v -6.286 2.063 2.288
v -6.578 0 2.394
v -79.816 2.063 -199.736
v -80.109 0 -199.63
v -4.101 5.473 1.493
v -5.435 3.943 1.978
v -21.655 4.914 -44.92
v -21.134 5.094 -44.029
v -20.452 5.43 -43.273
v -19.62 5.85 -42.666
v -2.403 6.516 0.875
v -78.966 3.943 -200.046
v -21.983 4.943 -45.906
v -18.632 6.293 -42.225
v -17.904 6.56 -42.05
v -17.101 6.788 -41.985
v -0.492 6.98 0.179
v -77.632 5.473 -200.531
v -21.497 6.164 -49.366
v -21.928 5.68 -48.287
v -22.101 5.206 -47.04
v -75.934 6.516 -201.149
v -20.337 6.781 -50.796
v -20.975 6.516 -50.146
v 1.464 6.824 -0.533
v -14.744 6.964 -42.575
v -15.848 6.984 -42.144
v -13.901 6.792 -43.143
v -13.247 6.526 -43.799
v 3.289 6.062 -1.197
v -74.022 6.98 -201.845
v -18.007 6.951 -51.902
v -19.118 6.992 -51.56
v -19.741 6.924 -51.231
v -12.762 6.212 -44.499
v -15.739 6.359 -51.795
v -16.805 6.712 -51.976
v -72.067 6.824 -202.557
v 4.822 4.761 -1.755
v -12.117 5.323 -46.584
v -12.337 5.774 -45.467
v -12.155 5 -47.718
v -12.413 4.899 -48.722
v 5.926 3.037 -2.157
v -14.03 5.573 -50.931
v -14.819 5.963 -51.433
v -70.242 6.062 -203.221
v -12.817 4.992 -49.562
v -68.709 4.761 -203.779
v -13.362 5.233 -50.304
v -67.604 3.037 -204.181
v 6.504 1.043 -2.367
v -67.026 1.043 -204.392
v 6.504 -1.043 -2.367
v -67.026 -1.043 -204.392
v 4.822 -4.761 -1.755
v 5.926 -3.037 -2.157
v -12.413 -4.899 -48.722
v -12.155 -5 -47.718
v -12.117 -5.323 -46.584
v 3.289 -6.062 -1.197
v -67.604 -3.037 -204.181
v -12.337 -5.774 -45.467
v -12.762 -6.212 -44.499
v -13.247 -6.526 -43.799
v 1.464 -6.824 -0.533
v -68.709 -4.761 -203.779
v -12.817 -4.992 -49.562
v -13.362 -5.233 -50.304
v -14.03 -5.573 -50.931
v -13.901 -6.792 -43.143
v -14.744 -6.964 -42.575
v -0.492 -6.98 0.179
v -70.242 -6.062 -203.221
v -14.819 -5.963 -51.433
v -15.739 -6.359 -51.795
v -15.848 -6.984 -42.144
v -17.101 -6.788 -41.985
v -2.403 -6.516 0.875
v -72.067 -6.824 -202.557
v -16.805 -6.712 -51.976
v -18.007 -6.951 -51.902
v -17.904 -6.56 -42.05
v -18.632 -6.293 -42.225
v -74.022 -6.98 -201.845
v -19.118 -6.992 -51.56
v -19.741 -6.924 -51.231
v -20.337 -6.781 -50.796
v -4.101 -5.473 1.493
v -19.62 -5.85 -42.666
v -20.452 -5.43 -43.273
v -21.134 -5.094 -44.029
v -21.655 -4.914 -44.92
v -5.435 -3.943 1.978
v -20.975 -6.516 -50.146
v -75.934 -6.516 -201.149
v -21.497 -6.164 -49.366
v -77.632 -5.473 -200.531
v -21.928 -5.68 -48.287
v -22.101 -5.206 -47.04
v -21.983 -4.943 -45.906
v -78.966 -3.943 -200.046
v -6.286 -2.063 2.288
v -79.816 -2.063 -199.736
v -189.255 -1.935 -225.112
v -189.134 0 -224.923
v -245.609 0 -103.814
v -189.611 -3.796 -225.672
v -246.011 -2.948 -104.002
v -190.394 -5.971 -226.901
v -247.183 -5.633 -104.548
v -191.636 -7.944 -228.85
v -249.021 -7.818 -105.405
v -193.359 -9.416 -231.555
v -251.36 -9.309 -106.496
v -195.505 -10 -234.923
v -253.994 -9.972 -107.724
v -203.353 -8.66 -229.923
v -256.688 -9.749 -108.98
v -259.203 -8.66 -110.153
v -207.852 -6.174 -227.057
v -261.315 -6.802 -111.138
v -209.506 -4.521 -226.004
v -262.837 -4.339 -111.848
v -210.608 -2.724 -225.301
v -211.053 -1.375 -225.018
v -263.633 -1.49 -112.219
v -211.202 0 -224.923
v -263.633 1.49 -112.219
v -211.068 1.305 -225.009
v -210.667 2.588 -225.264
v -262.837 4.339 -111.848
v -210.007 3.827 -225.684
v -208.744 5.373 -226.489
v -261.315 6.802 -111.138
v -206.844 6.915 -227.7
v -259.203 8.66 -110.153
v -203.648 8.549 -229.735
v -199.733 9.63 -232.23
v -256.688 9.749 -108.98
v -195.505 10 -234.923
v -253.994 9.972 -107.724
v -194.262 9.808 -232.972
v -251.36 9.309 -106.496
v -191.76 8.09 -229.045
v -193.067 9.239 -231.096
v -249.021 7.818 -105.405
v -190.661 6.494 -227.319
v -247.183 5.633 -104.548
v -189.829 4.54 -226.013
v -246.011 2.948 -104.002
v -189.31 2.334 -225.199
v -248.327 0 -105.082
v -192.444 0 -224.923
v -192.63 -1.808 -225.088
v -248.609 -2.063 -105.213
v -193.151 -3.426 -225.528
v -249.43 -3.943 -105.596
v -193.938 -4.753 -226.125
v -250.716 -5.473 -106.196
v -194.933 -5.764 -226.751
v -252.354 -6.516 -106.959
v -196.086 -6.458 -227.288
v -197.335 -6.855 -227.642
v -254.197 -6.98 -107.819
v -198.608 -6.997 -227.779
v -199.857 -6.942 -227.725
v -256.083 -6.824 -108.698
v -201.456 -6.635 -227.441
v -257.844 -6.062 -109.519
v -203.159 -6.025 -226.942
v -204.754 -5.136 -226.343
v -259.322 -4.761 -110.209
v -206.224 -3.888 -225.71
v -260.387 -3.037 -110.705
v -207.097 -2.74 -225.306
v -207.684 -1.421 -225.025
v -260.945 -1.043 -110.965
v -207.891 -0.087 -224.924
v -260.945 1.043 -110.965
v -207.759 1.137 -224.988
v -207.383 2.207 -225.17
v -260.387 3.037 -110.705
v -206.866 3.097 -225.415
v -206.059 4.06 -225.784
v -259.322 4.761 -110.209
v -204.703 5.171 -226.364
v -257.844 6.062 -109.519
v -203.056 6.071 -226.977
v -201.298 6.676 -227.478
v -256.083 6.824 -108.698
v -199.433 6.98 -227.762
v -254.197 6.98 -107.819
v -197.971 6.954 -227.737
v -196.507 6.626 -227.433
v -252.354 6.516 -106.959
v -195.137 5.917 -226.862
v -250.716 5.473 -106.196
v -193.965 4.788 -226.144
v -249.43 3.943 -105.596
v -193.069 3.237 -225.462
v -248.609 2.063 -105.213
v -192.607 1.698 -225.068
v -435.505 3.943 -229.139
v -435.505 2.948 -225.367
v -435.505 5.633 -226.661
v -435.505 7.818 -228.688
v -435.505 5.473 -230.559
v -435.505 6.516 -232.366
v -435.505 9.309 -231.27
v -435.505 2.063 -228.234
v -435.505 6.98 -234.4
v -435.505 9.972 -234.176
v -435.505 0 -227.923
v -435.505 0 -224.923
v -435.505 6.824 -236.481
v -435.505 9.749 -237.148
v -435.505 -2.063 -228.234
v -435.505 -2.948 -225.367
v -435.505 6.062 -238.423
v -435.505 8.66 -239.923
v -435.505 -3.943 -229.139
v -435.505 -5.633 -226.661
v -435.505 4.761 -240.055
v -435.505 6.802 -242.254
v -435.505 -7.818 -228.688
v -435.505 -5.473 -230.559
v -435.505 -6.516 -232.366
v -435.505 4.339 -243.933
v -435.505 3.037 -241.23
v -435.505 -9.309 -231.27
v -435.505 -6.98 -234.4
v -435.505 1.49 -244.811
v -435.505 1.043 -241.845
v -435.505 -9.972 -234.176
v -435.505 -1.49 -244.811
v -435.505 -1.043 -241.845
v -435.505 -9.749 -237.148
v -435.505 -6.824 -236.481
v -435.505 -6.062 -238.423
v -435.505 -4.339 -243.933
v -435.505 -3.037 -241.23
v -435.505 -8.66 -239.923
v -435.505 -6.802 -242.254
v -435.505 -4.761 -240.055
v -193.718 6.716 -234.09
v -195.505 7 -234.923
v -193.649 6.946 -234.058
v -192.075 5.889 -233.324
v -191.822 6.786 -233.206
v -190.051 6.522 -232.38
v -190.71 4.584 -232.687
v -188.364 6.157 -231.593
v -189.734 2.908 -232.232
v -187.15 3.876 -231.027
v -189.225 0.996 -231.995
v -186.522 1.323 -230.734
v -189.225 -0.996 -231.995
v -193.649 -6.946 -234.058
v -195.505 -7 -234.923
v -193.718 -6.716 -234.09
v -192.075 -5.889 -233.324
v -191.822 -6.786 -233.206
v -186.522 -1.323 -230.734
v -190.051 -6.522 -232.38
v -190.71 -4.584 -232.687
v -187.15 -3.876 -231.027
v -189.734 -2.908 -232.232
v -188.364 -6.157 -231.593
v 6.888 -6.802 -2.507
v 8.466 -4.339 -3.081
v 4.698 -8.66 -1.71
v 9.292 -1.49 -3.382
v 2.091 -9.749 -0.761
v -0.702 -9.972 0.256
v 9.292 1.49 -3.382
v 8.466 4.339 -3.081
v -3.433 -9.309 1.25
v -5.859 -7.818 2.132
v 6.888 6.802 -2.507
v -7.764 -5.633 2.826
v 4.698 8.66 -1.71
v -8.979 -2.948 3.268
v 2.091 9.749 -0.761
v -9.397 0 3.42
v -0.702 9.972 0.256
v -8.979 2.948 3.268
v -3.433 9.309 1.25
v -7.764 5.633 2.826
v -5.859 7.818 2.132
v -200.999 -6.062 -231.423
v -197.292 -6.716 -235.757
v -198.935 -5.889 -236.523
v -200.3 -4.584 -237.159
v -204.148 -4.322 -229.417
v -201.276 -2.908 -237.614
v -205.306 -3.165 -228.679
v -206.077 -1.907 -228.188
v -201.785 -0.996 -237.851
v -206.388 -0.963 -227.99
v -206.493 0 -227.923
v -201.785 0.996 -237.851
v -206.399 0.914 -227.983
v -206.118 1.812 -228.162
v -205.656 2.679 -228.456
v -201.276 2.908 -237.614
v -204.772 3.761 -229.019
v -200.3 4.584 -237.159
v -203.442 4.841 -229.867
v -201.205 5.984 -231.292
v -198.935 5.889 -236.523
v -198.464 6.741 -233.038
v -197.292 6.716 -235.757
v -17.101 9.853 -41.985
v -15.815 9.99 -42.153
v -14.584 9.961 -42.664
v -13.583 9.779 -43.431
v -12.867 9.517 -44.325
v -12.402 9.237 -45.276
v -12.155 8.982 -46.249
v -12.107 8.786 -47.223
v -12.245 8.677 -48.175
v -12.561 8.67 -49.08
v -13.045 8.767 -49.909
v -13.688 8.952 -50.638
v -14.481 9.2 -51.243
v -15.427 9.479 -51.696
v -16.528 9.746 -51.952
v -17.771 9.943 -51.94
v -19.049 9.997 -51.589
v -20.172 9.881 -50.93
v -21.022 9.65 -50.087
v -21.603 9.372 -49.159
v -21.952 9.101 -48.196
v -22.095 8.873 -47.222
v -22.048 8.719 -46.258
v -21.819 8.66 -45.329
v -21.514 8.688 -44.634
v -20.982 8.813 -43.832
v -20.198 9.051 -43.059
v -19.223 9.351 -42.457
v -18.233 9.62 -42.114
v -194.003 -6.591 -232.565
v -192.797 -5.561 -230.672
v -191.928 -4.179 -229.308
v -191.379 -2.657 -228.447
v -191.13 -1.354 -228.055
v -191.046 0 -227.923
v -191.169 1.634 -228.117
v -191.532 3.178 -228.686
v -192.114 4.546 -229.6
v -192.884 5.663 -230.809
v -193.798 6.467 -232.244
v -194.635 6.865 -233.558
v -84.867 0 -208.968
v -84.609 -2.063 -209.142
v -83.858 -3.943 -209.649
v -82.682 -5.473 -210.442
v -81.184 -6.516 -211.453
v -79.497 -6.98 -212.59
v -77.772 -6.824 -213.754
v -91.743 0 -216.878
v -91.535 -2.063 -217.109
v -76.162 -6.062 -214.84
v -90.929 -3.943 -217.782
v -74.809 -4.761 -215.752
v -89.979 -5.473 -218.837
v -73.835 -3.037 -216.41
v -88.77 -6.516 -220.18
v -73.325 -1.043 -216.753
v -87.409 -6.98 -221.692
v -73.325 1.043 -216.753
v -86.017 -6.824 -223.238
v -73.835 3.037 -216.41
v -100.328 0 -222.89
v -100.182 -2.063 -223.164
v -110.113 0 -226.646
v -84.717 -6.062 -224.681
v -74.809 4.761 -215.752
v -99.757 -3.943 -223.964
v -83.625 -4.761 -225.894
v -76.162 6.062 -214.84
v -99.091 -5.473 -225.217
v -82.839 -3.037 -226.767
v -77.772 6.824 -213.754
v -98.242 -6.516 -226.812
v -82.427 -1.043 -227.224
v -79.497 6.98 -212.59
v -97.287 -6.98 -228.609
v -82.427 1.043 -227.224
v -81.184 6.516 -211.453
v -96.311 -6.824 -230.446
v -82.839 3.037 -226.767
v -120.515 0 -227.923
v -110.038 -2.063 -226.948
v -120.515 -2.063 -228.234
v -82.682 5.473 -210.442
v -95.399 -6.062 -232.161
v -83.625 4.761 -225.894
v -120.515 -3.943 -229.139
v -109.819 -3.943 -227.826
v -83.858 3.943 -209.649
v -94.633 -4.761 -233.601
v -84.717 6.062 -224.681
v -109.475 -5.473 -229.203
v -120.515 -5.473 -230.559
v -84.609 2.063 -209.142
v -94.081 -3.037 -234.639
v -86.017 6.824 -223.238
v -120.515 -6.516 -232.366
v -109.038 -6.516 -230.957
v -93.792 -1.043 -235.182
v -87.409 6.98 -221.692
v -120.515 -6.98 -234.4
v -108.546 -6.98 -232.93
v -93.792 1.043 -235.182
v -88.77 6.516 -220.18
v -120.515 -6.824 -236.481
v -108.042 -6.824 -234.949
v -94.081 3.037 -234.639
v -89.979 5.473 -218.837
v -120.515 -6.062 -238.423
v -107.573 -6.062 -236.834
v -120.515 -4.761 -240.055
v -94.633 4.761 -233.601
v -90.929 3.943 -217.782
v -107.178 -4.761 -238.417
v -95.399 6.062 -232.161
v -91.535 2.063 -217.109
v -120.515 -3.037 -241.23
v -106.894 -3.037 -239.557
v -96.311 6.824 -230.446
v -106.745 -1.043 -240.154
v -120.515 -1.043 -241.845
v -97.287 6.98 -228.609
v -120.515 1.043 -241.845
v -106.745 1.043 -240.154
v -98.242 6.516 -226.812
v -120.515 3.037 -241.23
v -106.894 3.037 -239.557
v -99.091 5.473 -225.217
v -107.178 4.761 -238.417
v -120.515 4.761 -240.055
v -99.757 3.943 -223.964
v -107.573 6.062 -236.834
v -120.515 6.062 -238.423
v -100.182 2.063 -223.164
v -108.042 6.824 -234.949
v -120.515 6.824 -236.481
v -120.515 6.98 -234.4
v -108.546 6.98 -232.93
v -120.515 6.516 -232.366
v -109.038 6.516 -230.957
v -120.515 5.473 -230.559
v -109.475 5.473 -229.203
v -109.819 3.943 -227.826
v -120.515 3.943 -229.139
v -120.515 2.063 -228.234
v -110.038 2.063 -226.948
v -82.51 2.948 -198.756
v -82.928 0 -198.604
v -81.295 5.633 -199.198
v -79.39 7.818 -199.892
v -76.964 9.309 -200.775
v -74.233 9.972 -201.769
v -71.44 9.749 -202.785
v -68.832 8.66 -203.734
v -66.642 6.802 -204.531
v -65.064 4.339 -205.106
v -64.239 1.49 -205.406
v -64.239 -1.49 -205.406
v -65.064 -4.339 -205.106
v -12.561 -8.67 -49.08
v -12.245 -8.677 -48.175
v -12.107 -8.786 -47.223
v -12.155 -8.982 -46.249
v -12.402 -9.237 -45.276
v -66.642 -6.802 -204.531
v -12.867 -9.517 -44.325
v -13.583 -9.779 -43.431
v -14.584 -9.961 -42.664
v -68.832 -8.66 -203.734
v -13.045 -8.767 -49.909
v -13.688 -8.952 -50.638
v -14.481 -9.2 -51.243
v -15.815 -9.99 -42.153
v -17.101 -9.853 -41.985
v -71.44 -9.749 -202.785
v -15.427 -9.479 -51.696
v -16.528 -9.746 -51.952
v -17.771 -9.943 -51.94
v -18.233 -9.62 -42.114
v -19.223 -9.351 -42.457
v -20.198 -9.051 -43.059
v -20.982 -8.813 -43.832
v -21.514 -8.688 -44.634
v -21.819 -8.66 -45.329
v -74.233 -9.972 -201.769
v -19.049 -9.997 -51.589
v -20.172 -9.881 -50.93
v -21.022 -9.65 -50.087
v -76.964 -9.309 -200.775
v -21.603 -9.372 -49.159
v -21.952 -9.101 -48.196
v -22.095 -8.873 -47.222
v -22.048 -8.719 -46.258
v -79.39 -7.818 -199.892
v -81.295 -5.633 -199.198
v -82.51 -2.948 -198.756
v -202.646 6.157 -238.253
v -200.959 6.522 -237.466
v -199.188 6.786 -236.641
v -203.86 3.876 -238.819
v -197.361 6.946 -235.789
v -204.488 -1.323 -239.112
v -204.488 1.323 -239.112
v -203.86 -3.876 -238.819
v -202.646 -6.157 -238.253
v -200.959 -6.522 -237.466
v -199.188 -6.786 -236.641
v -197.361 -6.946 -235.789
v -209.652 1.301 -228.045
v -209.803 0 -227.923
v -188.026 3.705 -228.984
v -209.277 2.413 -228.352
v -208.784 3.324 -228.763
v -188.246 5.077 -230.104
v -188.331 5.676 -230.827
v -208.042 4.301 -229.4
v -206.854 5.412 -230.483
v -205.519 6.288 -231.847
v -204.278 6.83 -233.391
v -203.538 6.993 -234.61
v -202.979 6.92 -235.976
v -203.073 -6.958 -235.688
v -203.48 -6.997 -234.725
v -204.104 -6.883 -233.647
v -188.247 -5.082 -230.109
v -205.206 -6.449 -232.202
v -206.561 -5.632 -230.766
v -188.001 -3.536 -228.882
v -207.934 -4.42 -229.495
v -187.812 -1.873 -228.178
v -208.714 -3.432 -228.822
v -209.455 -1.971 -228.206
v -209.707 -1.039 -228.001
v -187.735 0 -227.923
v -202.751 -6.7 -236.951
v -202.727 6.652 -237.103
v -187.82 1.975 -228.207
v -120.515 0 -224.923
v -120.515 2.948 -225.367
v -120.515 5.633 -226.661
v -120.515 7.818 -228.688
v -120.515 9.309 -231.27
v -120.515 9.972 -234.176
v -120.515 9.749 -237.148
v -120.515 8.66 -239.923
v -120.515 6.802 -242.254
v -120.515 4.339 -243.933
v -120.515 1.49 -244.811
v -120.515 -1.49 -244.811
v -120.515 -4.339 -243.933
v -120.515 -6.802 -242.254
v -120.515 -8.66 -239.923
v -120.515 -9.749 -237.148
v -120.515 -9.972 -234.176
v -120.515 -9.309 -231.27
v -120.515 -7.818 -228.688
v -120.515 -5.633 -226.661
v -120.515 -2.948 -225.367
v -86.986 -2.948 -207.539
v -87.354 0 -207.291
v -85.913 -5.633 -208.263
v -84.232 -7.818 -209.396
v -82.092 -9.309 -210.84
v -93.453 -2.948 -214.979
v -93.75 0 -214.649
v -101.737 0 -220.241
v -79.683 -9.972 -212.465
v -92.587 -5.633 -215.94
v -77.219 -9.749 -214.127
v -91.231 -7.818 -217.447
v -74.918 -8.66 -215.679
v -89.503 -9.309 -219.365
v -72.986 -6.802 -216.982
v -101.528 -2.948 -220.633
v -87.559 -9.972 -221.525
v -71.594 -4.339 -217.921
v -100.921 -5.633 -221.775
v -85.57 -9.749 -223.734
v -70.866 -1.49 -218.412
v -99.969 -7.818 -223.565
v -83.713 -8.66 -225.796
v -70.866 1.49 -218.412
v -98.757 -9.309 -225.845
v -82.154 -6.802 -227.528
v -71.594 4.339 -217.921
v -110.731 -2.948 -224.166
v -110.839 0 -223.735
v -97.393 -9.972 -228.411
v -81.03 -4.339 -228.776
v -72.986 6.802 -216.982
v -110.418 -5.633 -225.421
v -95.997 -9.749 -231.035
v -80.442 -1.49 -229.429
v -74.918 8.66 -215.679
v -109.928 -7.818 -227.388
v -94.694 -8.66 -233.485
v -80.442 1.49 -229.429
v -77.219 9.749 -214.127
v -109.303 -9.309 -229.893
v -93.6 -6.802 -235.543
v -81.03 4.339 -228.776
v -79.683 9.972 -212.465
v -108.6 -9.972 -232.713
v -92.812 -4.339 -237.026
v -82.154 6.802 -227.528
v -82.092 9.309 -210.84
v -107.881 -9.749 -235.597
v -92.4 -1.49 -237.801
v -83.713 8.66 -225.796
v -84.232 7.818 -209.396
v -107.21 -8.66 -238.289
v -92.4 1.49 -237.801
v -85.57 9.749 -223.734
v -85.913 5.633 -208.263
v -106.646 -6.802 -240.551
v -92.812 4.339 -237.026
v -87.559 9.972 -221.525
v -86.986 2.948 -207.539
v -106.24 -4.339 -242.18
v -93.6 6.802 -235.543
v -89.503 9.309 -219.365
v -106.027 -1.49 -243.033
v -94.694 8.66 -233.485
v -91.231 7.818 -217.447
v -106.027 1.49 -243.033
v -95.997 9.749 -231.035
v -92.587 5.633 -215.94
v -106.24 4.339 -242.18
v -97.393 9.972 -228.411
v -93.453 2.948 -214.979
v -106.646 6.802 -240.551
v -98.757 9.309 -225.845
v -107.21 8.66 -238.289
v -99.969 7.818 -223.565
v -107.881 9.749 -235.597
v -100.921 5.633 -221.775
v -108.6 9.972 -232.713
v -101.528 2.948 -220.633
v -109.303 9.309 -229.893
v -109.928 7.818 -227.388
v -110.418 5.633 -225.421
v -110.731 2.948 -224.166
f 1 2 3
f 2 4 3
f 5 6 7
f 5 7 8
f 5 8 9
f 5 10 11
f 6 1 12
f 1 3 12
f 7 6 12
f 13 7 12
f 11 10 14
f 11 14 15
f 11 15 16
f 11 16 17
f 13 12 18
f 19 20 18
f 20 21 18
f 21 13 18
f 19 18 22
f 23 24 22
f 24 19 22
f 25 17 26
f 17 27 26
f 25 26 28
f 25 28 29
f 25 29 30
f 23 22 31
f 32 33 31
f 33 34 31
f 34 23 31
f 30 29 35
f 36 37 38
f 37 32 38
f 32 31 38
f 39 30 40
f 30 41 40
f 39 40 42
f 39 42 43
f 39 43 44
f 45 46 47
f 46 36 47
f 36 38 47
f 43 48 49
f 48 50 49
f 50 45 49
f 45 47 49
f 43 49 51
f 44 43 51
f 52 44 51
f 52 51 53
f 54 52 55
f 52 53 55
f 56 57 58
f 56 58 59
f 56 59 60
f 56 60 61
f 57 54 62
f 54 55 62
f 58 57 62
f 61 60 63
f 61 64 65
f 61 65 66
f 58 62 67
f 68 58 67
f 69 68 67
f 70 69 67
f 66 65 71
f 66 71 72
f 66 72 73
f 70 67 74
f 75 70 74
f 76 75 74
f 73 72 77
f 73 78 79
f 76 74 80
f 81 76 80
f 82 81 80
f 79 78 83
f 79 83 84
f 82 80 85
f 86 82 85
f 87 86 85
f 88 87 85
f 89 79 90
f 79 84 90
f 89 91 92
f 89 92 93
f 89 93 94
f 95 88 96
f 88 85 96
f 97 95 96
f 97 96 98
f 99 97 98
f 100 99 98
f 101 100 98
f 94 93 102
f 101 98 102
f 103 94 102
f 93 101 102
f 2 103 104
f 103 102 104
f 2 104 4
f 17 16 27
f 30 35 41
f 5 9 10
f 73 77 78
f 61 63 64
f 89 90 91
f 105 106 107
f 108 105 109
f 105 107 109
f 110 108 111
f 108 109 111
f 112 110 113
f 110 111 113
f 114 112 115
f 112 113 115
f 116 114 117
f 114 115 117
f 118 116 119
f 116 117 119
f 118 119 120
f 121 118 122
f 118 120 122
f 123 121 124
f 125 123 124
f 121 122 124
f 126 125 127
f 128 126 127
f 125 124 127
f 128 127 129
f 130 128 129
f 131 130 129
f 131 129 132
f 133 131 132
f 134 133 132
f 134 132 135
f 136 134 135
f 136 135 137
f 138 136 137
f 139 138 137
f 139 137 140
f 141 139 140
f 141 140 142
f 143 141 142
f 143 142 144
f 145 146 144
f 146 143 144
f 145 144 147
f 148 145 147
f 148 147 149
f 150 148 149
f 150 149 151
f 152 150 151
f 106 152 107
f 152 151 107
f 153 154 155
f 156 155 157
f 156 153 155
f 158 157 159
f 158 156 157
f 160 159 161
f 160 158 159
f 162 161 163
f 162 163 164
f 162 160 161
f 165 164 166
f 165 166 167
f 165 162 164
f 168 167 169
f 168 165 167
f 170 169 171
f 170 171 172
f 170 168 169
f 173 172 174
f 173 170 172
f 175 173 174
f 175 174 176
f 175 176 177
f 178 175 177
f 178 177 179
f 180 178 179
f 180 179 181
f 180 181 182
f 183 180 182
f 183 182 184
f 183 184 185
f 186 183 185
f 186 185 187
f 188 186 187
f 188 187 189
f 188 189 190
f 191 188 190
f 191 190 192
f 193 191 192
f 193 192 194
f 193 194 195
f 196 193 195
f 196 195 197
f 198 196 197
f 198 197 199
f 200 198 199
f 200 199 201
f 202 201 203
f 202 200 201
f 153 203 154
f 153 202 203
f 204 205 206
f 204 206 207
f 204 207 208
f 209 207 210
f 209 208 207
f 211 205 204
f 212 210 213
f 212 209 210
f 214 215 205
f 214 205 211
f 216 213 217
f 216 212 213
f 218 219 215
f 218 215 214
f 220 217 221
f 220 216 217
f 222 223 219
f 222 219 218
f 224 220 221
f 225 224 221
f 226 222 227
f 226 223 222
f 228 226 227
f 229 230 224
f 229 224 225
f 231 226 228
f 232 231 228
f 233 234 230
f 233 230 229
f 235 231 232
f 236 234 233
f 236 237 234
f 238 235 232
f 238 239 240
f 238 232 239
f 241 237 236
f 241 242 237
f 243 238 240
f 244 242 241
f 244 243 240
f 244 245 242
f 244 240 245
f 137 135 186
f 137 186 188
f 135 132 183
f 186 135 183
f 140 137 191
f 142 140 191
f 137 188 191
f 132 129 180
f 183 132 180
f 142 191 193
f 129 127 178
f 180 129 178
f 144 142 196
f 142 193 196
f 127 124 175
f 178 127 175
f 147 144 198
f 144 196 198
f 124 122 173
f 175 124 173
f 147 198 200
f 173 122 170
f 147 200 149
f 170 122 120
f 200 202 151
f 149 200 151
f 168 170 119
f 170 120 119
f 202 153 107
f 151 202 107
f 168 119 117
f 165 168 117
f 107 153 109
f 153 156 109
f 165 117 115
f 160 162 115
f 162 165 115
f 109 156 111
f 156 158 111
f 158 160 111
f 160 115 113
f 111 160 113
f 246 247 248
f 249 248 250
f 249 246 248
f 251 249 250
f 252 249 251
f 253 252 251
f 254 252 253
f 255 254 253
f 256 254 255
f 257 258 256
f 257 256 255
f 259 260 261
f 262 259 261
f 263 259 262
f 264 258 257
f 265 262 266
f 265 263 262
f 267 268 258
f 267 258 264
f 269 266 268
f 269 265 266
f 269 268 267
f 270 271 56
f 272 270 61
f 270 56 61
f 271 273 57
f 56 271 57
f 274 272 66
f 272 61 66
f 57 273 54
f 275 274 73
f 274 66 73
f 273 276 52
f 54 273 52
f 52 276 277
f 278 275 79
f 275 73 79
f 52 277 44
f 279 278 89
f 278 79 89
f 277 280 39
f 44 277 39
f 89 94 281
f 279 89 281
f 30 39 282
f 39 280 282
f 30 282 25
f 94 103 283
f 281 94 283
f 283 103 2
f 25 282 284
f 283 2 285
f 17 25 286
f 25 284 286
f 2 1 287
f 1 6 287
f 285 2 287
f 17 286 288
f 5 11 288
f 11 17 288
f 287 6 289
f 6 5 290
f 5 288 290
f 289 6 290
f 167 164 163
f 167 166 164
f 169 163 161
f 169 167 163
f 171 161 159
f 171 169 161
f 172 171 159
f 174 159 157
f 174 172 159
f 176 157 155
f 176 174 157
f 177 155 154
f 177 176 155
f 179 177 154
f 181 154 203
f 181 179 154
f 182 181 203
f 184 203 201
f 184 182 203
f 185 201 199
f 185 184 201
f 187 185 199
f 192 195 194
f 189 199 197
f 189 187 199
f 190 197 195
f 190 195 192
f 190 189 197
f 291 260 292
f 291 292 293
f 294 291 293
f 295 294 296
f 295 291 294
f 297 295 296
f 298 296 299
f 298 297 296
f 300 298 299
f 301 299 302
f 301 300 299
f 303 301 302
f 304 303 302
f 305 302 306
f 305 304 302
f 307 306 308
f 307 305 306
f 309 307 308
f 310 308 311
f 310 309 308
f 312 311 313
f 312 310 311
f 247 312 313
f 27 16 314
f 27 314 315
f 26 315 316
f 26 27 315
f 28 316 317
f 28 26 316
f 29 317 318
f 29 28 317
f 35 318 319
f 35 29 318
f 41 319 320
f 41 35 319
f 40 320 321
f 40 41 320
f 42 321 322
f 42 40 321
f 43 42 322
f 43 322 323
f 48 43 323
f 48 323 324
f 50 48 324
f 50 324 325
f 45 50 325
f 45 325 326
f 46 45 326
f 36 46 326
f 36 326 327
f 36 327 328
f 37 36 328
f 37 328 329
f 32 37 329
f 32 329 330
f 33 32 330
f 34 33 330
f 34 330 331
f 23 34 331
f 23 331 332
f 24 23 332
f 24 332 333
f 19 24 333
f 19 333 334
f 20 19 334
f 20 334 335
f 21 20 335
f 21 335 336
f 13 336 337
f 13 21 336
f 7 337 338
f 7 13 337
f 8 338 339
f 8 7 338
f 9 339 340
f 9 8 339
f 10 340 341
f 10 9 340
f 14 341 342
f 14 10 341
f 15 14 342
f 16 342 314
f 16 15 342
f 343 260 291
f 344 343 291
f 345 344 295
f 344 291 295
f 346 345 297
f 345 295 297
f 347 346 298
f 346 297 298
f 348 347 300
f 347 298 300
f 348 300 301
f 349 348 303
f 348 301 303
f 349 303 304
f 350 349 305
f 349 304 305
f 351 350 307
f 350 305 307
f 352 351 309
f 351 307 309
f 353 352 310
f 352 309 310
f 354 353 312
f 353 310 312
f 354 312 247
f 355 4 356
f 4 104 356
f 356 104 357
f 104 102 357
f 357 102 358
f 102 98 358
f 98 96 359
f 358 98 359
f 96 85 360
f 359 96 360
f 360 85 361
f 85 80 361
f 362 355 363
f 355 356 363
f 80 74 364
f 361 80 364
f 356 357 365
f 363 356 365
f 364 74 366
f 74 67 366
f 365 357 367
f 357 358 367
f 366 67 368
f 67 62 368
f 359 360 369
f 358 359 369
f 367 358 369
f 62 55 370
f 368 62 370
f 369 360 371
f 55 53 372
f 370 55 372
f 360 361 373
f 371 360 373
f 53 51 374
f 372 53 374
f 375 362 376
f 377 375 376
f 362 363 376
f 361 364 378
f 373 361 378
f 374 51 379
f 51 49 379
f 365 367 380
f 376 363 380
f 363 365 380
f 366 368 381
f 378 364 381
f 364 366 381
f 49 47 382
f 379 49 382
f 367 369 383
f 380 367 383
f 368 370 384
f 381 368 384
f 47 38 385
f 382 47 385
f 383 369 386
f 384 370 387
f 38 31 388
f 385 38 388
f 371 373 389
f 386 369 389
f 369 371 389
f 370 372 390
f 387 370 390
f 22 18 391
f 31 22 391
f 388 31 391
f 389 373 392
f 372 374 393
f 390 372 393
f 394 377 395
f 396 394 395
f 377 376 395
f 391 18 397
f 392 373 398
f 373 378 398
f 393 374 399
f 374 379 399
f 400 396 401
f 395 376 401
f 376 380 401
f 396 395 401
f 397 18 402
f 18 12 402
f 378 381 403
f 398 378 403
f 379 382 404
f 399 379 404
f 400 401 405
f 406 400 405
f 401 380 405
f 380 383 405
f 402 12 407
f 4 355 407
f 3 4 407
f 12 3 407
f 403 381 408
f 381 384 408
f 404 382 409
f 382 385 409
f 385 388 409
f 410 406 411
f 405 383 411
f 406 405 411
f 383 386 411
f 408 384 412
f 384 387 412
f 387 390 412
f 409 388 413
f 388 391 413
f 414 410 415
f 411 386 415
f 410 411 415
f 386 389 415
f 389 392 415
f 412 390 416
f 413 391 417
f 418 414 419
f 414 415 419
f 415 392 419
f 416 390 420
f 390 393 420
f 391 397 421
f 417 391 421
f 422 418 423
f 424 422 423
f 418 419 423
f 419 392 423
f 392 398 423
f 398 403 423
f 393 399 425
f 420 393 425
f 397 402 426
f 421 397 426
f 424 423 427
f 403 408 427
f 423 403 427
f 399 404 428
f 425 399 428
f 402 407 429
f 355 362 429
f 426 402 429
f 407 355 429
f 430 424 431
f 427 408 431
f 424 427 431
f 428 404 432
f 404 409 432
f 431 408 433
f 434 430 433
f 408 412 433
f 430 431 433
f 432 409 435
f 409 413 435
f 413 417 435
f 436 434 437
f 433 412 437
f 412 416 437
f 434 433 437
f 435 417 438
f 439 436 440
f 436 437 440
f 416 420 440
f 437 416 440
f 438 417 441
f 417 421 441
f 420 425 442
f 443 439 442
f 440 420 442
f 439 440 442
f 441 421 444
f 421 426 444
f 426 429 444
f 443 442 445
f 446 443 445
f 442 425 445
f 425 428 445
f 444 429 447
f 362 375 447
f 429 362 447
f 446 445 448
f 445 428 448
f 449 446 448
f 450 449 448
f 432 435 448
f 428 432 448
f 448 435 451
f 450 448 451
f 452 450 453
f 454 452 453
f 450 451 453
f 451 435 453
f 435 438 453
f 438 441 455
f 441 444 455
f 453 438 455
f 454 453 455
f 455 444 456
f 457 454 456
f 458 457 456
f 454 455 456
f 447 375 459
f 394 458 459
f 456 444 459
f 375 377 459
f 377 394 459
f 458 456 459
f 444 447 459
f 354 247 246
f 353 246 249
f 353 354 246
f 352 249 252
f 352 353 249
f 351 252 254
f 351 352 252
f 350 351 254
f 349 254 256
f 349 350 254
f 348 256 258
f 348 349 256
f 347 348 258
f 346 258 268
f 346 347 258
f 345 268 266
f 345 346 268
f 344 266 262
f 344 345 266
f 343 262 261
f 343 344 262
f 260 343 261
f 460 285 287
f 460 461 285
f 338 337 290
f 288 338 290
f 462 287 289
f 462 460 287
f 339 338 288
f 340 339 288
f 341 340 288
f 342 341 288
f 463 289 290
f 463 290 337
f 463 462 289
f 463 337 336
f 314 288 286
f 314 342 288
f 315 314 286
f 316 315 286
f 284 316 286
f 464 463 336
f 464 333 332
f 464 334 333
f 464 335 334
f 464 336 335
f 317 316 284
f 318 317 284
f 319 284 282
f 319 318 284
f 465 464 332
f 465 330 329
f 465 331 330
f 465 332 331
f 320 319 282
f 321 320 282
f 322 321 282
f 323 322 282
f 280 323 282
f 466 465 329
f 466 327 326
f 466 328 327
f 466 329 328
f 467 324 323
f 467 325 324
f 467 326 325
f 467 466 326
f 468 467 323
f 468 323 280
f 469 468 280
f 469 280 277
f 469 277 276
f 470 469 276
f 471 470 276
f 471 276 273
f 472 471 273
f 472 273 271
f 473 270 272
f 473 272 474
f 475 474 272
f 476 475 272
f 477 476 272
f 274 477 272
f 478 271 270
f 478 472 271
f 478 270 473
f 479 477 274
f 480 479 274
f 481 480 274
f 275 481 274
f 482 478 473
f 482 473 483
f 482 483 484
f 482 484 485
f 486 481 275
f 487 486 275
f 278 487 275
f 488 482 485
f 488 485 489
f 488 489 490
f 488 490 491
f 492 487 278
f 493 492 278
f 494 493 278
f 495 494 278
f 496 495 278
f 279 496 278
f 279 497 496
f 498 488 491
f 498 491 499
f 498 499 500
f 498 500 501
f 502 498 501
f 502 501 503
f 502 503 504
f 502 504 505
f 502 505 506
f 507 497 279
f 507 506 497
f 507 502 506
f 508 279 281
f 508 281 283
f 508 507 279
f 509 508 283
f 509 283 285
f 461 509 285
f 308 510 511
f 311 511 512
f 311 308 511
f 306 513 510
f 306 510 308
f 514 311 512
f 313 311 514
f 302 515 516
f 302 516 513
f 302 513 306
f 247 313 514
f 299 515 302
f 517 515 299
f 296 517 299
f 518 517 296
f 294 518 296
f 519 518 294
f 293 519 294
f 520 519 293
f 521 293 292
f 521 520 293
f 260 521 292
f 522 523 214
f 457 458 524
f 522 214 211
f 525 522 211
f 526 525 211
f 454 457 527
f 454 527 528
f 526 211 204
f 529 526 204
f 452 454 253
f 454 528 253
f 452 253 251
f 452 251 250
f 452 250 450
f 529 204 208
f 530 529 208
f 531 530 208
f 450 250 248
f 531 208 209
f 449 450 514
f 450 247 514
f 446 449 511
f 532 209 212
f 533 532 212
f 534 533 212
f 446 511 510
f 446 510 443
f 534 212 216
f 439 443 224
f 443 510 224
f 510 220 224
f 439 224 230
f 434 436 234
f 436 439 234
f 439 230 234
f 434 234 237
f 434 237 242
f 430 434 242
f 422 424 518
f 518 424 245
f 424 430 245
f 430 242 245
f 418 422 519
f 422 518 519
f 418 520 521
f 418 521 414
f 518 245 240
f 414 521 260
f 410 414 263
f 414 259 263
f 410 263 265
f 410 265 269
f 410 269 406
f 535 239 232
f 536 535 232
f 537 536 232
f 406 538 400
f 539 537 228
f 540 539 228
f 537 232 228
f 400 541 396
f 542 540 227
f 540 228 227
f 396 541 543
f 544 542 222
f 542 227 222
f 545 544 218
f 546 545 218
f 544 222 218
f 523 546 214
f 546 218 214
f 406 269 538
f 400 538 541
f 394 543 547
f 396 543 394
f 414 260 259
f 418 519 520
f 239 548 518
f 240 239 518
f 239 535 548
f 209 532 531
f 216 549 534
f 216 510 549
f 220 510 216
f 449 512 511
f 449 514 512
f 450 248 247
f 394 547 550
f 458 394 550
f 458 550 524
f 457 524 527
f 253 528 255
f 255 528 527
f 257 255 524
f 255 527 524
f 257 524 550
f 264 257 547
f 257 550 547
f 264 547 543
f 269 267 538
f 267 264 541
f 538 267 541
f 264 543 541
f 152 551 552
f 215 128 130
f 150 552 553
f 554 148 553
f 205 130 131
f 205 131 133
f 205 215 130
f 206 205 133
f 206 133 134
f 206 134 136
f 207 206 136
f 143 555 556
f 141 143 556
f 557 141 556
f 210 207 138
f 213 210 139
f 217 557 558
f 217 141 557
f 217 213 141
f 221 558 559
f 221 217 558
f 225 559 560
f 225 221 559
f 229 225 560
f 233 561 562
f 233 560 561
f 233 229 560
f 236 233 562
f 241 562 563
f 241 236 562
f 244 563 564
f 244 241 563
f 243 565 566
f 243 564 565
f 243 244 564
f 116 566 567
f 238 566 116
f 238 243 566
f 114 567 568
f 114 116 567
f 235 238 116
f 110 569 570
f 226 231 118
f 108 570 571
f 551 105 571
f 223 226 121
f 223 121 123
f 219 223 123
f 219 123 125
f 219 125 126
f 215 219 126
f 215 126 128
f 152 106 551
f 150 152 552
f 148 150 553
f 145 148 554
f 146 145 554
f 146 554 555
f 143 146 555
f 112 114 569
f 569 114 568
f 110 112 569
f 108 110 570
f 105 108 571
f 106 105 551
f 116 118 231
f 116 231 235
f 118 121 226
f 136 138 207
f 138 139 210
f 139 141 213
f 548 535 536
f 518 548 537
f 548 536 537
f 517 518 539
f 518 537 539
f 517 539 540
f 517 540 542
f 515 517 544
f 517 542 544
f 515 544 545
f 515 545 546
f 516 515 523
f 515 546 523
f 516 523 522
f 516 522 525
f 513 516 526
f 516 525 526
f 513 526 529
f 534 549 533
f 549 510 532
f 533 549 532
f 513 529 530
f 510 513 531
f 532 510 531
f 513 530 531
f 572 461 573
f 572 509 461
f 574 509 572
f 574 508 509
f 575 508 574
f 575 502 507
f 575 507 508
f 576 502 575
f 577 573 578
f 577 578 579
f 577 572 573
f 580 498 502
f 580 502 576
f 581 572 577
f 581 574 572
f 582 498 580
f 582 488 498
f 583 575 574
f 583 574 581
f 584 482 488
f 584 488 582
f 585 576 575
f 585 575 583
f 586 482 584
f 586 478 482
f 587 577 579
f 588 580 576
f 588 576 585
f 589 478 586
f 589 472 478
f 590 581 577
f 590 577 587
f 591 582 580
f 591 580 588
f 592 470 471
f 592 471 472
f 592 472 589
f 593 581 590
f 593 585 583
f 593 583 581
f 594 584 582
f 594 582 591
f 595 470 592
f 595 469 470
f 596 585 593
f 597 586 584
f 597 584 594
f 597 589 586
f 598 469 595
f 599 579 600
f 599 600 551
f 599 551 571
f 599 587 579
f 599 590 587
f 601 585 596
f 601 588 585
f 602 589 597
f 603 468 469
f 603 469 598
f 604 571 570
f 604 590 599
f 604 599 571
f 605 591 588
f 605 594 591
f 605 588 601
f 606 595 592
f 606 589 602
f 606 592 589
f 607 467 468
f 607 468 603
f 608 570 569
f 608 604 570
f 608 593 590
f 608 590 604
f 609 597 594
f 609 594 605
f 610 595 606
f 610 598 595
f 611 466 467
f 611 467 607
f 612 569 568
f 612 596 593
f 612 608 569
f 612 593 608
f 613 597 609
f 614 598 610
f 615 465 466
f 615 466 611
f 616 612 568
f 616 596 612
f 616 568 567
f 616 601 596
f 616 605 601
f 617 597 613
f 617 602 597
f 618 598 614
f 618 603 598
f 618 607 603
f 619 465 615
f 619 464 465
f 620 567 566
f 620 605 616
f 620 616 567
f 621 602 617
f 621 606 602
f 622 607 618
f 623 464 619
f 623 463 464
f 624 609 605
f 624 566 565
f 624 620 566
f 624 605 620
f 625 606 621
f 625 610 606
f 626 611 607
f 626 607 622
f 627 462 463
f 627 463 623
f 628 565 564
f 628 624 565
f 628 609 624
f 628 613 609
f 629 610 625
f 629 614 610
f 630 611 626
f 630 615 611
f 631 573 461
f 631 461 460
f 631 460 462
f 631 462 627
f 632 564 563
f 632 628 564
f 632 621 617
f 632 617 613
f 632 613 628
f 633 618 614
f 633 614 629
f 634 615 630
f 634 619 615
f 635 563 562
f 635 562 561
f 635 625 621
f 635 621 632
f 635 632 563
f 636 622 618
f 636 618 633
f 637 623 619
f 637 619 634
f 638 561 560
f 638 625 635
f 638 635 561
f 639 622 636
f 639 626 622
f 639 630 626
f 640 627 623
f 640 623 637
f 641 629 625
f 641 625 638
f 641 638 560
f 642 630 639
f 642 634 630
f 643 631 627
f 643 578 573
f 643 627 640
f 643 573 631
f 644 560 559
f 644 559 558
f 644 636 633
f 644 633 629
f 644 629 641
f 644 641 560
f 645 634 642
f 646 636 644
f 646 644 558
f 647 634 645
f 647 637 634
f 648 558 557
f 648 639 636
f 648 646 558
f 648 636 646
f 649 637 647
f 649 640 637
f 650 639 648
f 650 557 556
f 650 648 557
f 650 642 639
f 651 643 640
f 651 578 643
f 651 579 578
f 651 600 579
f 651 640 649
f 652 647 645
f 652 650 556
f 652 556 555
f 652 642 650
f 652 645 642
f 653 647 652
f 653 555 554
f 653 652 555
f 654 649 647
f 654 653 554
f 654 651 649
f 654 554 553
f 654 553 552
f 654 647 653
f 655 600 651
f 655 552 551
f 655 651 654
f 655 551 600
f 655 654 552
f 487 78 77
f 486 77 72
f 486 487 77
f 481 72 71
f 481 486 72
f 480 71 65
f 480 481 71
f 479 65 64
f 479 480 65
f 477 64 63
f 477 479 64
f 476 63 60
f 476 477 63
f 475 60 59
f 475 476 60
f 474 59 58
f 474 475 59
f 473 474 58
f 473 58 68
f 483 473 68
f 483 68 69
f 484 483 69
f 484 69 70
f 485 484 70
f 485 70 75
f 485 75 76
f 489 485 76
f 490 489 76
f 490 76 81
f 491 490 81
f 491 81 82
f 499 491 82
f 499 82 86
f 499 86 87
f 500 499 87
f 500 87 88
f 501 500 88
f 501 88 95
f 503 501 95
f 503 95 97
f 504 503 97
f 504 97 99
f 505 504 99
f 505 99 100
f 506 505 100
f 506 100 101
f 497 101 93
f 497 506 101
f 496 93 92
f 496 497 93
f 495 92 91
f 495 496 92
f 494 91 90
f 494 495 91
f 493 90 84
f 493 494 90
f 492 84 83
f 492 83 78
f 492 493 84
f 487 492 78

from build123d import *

# Parameters (mm, degrees)
SWEEP_THIN2_PROFILE_R   = 10
SWEEP_THIN2_PROFILE_R_2 = 7
CUT_EXTRUDE1_DEPTH      = 500.751926697
CUT_EXTRUDE1_DEPTH_BACK = 500.751926697
SKETCH22_R              = 5
SWEEP_THIN3_START       = -9.711313495
SWEEP_THIN3_OUTLINE_R   = 10
SWEEP_THIN3_OUTLINE_R_2 = 7
SWEEP_THIN3_DEPTH       = 140


with BuildPart() as part:
    # Sweep-Thin2: sweep along a path in Sketch1
    with BuildLine(Plane(origin=(0, 0, 0), x_dir=(1, 0, 0), z_dir=(0, 1, 0))) as sweep_thin2_path:
        Line((0, 0), (-73.530781703, 202.024162363))
        ThreePointArc((-73.530781703, 202.024162363), (-91.836590924, 225.880757411), (-120.515412742, 234.923155196))
        Line((-120.515412742, 234.923155196), (-435.505035831, 234.923155196))
    # Sweep-Thin2 profile (on start of the path) → Sweep-Thin2 (sweep)
    with BuildSketch(Plane(origin=(0, 0, 0), x_dir=(-0.9396926207859093, 0, 0.3420201433256662), z_dir=(-0.3420201433256662, 0, -0.9396926207859093))):
        Circle(SWEEP_THIN2_PROFILE_R)
        Circle(SWEEP_THIN2_PROFILE_R_2, mode=Mode.SUBTRACT)
    sweep(path=sweep_thin2_path.line)

    # Sketch22 → Cut-Extrude1 (cut, two sides: drawn at the far end of the back side and taken through both)
    with BuildSketch(Plane(origin=(0, 0, 0), x_dir=(1, 0, 0), z_dir=(0, 1, 0)).offset(-CUT_EXTRUDE1_DEPTH_BACK)):
        with Locations(Location((-17.101007166, 46.984631039, 0), (0, 0, 270))):
            Circle(SKETCH22_R)
    extrude(amount=CUT_EXTRUDE1_DEPTH + CUT_EXTRUDE1_DEPTH_BACK, mode=Mode.SUBTRACT)

    # Sweep-Thin3: read off the stored shape, not the designer's step
    # Sweep-Thin3 outline → Sweep-Thin3 (add)
    with BuildSketch(Plane(origin=(0, 0, 0), x_dir=(0.906307787036651, 0, 0.42261826174069705), z_dir=(0.42261826174069705, 0, -0.9063077870366512)).offset(SWEEP_THIN3_START)):
        with Locations((-276.470551871, 0)):
            Circle(SWEEP_THIN3_OUTLINE_R)
        with Locations((-276.470551871, 0)):
            Circle(SWEEP_THIN3_OUTLINE_R_2, mode=Mode.SUBTRACT)
    extrude(amount=SWEEP_THIN3_DEPTH)


solid = part.part
